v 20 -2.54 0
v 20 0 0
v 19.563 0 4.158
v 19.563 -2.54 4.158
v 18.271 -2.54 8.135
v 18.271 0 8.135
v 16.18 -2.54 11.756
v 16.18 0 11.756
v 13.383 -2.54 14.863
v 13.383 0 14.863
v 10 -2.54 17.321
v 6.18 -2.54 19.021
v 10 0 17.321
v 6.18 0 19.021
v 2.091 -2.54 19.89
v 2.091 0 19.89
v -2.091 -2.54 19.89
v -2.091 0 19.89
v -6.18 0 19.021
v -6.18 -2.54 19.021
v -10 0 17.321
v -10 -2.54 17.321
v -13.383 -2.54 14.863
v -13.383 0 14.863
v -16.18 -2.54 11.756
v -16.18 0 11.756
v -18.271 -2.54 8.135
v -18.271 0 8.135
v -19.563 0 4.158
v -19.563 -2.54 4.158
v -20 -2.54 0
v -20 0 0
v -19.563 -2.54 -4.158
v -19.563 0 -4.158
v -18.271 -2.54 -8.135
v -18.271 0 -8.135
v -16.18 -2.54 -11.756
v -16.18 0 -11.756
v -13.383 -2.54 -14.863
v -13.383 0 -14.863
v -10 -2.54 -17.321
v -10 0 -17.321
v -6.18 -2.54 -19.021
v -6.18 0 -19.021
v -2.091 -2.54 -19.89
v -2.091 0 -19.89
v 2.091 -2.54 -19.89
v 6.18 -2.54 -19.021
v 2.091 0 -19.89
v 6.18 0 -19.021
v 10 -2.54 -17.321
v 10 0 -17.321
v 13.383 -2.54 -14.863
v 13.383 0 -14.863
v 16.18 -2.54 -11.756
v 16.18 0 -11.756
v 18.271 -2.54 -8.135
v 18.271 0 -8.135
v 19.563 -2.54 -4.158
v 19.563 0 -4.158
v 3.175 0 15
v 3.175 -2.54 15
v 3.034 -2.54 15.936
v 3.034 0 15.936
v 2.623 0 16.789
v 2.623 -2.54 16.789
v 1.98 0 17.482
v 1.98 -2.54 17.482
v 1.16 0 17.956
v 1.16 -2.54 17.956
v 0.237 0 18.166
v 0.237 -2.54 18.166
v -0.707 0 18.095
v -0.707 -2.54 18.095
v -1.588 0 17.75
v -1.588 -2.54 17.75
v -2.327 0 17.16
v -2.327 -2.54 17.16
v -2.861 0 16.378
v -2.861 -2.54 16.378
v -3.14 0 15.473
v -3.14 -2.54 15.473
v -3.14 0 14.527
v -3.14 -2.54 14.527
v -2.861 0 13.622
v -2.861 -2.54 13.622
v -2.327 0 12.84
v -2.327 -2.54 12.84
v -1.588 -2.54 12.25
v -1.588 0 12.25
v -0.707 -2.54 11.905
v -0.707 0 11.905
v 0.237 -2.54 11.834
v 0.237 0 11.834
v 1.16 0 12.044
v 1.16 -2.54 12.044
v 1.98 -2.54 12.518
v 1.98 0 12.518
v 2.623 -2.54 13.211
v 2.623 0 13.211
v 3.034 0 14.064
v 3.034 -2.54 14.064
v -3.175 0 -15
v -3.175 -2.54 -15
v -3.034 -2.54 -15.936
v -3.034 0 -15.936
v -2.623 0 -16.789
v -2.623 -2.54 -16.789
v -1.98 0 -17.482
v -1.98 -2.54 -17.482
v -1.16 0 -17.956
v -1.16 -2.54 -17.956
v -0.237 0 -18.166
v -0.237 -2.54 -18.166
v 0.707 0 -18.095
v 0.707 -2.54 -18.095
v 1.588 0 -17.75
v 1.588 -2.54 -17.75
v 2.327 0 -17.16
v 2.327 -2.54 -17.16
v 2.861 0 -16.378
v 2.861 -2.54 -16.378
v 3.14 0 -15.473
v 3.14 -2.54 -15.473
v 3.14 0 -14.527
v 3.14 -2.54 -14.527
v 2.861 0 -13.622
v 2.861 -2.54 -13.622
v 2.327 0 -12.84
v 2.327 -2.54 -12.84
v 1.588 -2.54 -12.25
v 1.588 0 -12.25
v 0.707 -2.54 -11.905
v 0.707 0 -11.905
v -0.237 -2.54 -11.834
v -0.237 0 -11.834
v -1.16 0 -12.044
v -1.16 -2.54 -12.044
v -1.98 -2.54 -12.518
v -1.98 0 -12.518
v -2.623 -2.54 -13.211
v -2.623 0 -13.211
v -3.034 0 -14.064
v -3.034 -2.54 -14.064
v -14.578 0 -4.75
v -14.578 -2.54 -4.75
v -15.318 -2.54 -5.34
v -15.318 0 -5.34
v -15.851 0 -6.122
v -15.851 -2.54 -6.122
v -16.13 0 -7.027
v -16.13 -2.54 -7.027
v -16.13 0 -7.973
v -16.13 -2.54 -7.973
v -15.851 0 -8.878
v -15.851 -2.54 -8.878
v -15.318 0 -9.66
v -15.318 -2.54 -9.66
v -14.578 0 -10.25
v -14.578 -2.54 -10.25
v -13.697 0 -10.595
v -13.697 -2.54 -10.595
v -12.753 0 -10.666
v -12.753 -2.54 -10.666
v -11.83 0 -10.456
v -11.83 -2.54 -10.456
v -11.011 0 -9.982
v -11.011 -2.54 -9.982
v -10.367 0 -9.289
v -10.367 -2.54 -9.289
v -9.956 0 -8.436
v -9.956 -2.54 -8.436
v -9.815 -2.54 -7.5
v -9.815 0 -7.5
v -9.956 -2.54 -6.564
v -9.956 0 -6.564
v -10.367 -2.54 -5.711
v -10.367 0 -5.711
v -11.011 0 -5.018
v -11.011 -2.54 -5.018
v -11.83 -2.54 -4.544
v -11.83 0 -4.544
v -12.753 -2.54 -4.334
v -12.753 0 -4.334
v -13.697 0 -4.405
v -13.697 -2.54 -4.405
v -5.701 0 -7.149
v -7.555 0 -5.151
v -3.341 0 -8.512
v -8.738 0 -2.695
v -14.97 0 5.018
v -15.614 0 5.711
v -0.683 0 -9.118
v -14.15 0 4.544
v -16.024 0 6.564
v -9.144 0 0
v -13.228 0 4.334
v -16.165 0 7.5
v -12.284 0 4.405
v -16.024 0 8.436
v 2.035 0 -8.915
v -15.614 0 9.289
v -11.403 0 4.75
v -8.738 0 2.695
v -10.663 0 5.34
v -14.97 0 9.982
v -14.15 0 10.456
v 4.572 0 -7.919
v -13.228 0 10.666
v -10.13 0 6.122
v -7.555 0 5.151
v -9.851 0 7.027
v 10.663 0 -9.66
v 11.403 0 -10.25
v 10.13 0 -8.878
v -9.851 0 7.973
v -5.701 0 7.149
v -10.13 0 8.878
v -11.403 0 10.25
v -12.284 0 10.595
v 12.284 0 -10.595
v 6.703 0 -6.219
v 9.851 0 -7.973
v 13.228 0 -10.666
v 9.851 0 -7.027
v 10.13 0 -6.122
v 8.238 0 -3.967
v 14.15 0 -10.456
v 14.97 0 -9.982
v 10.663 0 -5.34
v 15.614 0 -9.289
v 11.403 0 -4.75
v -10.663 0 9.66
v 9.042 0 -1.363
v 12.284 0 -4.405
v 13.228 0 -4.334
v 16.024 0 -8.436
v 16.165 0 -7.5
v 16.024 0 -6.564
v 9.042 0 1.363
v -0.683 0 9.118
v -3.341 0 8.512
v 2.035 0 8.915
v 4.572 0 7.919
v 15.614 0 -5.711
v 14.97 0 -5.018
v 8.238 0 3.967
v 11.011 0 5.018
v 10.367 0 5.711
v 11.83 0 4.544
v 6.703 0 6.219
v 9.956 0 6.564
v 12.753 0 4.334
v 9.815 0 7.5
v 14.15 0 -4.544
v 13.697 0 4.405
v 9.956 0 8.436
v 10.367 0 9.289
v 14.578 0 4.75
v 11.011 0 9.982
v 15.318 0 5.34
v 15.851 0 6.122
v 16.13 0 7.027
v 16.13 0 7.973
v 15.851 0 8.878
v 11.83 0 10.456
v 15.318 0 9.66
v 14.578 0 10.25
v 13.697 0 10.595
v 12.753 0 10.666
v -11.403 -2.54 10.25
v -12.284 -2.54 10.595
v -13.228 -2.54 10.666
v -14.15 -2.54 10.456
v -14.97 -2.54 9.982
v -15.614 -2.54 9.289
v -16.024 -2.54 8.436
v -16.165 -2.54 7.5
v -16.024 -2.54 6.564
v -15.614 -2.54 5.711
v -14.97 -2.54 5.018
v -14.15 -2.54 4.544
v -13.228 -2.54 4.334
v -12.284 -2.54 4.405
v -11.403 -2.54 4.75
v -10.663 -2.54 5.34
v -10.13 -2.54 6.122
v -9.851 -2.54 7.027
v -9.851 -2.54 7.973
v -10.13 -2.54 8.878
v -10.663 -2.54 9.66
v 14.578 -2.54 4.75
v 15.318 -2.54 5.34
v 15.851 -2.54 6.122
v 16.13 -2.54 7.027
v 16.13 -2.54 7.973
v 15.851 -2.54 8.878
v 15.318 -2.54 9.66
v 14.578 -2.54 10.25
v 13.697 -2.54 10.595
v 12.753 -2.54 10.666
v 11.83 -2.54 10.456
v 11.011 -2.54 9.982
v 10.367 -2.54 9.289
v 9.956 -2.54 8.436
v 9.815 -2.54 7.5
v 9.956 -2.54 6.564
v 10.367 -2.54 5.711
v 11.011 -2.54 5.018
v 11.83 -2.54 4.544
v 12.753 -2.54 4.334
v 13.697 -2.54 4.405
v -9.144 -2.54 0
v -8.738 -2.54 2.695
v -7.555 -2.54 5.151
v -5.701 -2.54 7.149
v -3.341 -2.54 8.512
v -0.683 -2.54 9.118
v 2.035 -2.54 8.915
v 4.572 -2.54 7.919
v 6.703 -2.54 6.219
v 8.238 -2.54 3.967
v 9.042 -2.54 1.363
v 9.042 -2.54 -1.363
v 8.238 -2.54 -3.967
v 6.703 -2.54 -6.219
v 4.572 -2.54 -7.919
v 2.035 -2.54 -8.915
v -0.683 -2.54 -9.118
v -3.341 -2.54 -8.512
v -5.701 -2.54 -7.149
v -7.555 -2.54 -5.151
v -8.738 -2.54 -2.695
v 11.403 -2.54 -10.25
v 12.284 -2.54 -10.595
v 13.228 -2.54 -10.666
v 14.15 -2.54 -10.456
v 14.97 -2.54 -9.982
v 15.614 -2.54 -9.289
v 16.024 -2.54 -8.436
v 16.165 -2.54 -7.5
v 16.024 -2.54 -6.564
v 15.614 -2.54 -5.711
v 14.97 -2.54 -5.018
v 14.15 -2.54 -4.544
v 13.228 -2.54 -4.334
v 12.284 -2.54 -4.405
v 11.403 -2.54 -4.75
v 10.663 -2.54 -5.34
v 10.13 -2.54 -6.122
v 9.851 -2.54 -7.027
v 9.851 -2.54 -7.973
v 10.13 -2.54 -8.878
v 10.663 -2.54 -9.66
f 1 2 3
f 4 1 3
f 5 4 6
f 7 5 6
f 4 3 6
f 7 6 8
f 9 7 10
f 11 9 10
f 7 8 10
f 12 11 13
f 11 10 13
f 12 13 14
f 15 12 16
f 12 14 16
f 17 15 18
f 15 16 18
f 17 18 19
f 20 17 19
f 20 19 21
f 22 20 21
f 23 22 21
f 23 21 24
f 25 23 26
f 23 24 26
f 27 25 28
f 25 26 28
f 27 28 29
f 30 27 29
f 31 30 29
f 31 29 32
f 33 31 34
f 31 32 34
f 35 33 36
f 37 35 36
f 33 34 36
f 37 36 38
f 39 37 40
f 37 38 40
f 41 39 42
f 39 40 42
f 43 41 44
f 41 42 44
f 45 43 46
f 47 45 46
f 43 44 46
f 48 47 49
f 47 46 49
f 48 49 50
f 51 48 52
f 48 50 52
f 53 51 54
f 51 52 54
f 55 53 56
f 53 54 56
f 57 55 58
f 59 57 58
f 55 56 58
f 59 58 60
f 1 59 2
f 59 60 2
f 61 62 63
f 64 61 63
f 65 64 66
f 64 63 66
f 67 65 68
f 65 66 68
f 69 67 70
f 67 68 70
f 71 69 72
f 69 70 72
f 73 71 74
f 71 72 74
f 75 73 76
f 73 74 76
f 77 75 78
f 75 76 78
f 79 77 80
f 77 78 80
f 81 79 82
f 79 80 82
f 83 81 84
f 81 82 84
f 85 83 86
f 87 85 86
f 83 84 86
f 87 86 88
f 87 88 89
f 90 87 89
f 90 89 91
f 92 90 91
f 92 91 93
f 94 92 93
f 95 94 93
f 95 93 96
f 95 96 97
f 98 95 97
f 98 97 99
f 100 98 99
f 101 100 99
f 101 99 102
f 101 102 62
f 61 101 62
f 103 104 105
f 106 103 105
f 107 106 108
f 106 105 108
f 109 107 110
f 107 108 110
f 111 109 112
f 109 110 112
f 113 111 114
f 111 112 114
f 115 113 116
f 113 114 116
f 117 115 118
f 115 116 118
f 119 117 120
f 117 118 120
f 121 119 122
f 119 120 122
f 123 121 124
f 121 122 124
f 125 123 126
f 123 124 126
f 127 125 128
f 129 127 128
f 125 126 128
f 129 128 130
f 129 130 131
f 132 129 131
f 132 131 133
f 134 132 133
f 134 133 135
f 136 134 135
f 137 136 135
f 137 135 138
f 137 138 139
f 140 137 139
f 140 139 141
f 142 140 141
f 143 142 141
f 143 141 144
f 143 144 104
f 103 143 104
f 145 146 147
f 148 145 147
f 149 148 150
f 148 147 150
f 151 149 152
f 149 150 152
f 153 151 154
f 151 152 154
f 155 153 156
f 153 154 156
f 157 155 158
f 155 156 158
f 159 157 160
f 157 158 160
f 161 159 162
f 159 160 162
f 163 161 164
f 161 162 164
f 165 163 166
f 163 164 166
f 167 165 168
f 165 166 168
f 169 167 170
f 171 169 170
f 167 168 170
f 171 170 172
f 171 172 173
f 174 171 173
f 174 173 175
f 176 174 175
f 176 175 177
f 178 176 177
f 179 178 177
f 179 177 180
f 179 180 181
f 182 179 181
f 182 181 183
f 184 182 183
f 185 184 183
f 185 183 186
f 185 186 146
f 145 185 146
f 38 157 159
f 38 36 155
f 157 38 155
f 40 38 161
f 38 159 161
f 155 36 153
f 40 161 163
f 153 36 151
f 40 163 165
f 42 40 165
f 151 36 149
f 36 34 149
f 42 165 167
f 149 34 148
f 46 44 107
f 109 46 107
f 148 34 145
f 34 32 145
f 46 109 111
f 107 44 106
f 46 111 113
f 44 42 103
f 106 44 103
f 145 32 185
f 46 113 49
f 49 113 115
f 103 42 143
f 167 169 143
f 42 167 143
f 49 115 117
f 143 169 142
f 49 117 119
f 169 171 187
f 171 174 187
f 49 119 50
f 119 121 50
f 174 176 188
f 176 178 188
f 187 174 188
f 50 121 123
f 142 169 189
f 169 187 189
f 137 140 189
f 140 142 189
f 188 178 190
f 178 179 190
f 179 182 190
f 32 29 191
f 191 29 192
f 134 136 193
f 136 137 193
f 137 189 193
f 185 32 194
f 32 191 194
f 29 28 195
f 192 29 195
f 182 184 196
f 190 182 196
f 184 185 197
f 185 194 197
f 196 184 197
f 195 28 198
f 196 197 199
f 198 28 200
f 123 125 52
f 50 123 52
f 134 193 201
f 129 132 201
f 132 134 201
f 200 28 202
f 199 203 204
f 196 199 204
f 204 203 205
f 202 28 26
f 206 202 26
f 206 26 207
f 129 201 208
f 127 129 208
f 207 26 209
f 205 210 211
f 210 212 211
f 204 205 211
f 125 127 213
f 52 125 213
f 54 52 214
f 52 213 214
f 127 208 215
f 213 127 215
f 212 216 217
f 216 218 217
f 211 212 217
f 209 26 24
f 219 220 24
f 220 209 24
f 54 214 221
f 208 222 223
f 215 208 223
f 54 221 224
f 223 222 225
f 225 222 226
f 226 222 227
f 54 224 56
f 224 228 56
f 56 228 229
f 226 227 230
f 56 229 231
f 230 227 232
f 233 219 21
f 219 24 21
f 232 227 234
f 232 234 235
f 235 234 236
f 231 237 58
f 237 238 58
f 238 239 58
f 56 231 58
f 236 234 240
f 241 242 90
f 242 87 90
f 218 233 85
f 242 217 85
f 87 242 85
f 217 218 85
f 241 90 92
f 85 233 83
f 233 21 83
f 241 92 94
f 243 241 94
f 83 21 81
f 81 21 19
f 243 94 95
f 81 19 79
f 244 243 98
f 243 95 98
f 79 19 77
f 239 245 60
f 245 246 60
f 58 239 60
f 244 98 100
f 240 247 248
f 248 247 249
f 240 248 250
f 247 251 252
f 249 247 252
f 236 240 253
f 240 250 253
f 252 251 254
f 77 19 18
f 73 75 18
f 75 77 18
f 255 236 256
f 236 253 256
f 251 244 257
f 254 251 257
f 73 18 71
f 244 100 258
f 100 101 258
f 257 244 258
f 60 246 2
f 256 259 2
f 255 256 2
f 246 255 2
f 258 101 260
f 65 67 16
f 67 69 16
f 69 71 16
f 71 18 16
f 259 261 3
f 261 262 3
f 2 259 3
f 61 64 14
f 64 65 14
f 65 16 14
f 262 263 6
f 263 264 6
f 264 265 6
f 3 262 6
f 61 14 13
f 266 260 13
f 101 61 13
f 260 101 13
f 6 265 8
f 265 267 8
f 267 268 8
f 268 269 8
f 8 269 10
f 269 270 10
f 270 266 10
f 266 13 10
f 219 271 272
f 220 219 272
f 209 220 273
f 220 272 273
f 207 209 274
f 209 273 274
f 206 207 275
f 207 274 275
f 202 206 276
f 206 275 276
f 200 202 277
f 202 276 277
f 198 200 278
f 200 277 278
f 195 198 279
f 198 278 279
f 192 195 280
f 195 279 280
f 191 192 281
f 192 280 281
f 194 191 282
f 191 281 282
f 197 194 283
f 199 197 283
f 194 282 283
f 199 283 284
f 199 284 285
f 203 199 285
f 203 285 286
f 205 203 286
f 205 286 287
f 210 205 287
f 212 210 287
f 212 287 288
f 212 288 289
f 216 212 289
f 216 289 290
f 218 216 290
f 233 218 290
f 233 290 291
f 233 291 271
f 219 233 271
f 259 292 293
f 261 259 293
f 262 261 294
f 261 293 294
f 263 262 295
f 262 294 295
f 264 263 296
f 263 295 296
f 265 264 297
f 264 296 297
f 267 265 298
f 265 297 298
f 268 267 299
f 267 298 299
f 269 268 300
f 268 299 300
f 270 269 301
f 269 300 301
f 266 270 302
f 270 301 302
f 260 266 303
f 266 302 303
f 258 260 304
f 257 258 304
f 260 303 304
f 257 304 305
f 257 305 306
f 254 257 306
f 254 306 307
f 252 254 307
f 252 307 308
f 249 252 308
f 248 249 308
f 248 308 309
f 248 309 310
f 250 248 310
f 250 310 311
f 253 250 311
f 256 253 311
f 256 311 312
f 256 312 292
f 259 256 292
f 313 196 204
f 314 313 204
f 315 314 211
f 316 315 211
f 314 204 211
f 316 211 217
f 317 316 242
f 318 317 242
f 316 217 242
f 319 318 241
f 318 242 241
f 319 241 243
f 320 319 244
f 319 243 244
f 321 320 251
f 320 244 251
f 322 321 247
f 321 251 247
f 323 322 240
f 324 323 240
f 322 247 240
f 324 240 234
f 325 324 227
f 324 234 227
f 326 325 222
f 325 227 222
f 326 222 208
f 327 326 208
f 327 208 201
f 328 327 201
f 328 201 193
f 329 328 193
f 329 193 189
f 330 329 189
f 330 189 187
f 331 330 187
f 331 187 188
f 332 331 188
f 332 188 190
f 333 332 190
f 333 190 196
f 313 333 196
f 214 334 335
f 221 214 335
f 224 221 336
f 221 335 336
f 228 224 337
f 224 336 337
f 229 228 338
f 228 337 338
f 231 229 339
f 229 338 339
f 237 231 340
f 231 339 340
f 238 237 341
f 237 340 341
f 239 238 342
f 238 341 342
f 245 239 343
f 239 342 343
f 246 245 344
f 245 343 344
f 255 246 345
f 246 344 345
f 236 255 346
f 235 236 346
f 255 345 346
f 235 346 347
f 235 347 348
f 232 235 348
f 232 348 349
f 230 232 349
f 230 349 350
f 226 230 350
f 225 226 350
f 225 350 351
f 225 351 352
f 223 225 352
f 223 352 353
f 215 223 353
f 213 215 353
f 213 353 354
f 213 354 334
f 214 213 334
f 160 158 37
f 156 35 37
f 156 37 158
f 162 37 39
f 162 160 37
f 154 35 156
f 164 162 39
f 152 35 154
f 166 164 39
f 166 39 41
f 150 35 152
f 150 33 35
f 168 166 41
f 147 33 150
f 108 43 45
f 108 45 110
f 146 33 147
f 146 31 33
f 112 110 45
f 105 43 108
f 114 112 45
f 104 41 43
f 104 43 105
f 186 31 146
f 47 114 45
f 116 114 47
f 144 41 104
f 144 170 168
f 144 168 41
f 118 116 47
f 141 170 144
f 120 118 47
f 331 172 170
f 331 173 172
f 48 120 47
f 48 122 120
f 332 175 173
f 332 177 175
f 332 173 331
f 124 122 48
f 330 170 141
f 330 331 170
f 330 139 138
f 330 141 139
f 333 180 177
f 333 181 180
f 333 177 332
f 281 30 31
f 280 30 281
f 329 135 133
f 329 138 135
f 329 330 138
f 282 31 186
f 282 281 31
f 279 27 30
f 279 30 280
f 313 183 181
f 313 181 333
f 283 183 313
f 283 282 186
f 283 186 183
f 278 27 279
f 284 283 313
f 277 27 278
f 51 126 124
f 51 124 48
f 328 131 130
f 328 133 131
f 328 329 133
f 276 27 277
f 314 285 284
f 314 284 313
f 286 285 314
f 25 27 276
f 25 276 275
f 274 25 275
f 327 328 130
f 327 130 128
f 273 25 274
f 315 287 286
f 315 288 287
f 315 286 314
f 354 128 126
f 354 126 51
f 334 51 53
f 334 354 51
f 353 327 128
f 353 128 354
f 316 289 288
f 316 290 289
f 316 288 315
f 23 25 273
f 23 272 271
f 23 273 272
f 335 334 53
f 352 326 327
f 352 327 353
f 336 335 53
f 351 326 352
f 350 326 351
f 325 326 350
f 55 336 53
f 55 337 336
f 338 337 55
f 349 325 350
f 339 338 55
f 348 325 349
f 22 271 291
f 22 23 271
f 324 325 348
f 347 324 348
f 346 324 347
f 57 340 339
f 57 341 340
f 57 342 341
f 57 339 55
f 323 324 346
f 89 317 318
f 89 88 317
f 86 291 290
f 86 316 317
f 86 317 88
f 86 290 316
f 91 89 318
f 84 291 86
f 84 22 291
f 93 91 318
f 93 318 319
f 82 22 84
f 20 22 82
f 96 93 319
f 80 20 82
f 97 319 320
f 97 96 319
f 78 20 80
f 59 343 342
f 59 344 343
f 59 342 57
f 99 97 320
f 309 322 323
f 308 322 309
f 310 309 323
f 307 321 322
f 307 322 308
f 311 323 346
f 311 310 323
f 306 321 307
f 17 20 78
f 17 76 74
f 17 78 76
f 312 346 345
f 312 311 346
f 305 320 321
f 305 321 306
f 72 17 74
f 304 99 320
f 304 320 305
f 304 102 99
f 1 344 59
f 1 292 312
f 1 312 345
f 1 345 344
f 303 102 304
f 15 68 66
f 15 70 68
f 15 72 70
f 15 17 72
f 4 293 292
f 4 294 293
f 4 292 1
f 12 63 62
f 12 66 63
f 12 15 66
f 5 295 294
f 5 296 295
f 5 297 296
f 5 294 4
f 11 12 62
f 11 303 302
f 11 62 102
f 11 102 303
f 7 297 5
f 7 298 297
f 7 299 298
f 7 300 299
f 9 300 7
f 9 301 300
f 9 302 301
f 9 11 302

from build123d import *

# Parameters (mm, degrees)
F0_R            = 20
F1_DEPTH        = 2.54
F2_R            = 9.144
F3_DEPTH        = 8.5
F4_R            = 3.175
F5_DEPTH        = 2.541
F5_COPIES_COUNT = 6


# Not quite as in the source:
# - a pattern or mirror of a feature is missing from the dataset's text; its kind, count and spacing are read off the source's solid


with BuildPart() as f1:
    # F0 (on Front) → F1 (new body)
    with BuildSketch(Plane.XZ):
        Circle(F0_R)
    extrude(amount=F1_DEPTH)

    # F2 (on face) → F3 (cut)
    with BuildSketch(Plane(origin=(0, 0, 0), x_dir=(-1, 0, 0), z_dir=(0, 1, 0))):
        Circle(F2_R)
    extrude(amount=-F3_DEPTH, mode=Mode.SUBTRACT)

    # F4 (on face) → F5 (cut, through all)
    with BuildSketch(Plane.XZ.offset(2.54)):
        with Locations((0, 15)):
            Circle(F4_R)
    f5 = extrude(amount=-F5_DEPTH, mode=Mode.SUBTRACT)

    # F5_copies: F5 ×6 about axis
    f5_copies_axis = Axis((0, 0, 0), (0, 1, 0))
    for i in range(1, F5_COPIES_COUNT):
        add(f5.rotate(f5_copies_axis, i * 360 / F5_COPIES_COUNT), mode=Mode.SUBTRACT)


solid = f1.part
